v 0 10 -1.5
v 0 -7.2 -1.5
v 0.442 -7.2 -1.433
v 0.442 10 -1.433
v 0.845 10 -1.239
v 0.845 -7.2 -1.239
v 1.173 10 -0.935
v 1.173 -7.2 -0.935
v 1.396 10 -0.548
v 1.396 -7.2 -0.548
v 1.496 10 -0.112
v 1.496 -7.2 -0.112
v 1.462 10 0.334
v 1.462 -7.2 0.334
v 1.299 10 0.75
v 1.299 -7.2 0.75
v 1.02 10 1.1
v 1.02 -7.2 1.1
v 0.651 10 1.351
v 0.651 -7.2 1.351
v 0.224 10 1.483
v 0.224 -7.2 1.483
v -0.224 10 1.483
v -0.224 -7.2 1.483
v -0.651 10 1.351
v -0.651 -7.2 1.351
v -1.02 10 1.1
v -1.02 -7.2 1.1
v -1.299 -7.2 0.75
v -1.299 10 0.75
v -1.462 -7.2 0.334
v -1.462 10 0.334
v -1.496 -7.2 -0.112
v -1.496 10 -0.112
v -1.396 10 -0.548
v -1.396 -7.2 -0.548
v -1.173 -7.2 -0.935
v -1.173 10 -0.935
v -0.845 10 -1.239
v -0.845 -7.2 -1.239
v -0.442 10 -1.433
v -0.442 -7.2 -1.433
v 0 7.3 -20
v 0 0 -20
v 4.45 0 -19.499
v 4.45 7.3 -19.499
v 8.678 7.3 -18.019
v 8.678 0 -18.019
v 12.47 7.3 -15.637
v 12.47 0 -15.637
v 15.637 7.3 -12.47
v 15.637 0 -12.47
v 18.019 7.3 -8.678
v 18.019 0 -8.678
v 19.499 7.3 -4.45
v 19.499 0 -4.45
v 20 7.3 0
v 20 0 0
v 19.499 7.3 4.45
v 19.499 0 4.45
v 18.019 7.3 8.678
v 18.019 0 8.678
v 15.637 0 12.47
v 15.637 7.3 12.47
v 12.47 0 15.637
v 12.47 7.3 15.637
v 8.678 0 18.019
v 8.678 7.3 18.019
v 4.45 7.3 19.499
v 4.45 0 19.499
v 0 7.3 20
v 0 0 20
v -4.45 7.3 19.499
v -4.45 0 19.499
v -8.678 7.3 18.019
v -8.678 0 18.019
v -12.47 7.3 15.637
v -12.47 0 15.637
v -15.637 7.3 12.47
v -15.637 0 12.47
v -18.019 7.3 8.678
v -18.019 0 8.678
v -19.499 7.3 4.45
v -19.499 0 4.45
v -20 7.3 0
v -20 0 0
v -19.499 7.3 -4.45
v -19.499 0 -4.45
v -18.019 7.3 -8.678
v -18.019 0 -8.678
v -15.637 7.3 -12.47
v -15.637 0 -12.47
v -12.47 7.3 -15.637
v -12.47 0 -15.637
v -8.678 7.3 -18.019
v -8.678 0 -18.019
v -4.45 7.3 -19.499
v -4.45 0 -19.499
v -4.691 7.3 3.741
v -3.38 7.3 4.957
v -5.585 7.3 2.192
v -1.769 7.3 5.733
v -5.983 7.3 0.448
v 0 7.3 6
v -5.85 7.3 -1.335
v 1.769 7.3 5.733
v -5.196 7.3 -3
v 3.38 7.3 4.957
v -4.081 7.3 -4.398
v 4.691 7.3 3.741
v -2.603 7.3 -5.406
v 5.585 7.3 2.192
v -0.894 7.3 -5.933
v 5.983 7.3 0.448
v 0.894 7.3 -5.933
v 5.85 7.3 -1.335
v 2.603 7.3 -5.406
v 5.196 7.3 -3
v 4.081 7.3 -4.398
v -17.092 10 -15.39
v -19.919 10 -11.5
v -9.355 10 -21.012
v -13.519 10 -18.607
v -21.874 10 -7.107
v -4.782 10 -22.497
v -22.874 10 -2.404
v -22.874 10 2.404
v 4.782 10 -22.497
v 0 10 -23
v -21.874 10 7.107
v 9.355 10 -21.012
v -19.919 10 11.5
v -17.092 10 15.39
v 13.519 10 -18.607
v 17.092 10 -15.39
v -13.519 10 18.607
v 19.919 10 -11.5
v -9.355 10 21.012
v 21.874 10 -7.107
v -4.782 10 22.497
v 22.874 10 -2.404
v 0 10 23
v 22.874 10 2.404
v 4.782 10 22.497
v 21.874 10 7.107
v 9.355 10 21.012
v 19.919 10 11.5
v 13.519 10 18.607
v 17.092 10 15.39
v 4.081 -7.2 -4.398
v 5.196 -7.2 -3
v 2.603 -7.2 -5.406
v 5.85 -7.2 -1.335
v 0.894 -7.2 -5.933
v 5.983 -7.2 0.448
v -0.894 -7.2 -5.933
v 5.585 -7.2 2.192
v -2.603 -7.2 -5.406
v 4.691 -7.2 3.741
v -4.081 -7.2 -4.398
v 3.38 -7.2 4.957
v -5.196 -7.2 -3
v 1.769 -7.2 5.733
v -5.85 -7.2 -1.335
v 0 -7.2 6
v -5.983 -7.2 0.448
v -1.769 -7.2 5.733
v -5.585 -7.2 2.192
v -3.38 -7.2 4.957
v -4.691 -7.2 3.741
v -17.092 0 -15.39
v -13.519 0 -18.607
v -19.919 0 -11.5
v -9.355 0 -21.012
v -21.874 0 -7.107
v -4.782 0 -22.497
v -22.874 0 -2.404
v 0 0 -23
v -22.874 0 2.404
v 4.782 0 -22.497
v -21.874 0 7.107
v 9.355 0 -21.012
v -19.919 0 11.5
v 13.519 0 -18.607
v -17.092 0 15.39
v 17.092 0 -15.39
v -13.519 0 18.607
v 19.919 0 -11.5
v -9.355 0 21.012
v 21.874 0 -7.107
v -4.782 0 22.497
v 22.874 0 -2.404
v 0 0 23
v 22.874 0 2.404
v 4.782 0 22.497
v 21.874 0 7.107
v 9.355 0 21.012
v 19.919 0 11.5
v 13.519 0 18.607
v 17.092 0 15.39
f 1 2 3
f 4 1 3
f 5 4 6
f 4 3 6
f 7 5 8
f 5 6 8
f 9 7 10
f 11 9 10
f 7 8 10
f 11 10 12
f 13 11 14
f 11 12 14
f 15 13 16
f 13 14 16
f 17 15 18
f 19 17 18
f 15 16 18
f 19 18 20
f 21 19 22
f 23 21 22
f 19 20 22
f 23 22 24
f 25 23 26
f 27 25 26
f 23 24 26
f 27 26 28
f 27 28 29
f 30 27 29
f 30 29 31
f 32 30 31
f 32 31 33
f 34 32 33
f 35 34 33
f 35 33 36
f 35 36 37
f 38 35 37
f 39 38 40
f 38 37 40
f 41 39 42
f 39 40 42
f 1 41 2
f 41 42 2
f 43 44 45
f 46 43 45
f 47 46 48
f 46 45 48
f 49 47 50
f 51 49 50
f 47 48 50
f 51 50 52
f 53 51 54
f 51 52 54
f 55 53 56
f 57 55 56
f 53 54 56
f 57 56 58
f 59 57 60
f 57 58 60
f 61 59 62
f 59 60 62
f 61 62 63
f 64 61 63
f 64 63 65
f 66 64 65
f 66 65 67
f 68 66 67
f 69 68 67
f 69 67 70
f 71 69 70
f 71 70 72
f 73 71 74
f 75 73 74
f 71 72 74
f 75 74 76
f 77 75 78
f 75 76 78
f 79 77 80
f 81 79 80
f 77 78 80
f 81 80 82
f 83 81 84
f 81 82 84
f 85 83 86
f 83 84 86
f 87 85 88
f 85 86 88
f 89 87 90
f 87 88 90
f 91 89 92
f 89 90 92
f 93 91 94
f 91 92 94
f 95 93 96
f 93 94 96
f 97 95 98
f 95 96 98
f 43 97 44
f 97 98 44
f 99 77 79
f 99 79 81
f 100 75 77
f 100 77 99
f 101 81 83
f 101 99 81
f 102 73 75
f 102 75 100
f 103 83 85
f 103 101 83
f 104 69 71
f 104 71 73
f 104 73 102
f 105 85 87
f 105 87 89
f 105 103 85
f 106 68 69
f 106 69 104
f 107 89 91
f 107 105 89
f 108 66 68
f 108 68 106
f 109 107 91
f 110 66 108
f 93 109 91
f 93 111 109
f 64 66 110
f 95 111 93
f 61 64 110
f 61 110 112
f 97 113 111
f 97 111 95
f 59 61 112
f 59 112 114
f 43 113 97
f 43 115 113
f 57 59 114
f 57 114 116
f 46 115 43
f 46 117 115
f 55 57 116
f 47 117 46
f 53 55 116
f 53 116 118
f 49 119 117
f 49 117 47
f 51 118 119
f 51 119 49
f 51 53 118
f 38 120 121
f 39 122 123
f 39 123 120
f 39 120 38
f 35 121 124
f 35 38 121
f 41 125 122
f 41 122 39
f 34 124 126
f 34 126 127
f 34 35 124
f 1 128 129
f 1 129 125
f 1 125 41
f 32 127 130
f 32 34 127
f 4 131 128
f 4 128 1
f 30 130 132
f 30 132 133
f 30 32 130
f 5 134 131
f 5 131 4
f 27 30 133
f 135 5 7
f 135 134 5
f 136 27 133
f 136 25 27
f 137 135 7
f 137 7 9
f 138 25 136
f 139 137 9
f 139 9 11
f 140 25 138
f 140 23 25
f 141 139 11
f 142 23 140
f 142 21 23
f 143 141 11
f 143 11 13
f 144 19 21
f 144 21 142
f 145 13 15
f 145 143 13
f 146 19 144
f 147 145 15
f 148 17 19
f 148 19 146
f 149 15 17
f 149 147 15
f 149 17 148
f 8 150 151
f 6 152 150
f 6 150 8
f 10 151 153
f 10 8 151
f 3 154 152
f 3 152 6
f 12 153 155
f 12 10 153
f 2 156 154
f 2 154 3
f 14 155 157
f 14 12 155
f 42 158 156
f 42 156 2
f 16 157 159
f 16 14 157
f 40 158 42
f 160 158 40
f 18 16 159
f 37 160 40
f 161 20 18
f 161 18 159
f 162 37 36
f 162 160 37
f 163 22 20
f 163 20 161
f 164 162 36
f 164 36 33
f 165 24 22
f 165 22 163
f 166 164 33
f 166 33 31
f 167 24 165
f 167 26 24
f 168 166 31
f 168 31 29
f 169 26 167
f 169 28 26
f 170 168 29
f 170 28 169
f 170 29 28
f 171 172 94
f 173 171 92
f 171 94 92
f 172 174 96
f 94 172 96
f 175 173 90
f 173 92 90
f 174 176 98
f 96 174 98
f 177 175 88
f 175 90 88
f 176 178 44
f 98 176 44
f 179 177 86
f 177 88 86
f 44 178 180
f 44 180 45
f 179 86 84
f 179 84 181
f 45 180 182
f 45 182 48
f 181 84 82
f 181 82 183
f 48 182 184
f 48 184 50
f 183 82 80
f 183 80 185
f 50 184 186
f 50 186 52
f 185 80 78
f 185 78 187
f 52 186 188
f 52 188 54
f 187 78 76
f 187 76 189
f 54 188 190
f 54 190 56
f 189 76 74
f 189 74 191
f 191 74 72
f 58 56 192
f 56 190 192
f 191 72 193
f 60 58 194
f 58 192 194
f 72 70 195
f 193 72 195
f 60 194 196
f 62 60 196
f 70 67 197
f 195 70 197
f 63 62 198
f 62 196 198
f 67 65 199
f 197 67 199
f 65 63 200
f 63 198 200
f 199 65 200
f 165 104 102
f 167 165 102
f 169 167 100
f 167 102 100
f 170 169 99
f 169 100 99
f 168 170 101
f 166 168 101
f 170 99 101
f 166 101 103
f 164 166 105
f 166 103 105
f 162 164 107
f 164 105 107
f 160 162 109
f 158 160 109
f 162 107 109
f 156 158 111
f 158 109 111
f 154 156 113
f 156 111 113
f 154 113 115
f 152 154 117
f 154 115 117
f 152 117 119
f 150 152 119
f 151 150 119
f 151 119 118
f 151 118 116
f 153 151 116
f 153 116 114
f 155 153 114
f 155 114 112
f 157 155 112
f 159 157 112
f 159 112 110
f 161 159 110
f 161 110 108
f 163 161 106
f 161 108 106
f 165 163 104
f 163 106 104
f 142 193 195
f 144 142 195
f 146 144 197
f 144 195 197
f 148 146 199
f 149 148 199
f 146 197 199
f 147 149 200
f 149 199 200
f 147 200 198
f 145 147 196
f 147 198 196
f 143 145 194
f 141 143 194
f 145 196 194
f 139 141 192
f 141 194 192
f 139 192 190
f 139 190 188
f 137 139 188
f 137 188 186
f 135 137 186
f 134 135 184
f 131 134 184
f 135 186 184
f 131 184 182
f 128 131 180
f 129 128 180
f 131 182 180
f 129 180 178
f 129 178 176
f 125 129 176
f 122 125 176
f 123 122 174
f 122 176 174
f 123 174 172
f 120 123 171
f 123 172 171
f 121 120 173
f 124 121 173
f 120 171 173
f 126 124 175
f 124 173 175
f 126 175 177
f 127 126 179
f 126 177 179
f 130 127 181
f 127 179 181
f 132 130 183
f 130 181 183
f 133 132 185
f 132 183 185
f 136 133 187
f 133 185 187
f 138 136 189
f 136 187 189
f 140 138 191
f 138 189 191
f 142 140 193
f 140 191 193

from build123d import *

# Parameters (mm, degrees)
SKETCH1_R           = 23
BOSS_EXTRUDE1_DEPTH = 10
SKETCH2_R           = 20
CUT_EXTRUDE1_DEPTH  = 7.3
SKETCH3_R           = 6
BOSS_EXTRUDE3_DEPTH = 14.5
SKETCH4_R           = 1.5
CUT_EXTRUDE2_DEPTH  = 17.2


with BuildPart() as part:
    # Sketch1 → Boss-Extrude1 (new body)
    with BuildSketch(Plane(origin=(0, 0, 0), x_dir=(1, 0, 0), z_dir=(0, 1, 0))):
        with Locations(Location((0, 0, 0), (0, 0, 270))):
            Circle(SKETCH1_R)
    extrude(amount=BOSS_EXTRUDE1_DEPTH)

    # Sketch2 → Cut-Extrude1 (cut)
    with BuildSketch(Plane.XZ):
        with Locations(Location((0, 0, 0), (0, 0, 270))):
            Circle(SKETCH2_R)
    extrude(amount=-CUT_EXTRUDE1_DEPTH, mode=Mode.SUBTRACT)

    # Sketch3 → Boss-Extrude3 (add)
    with BuildSketch(Plane.XZ.offset(-7.3)):
        with Locations(Location((0, 0, 0), (0, 0, 90))):
            Circle(SKETCH3_R)
    extrude(amount=BOSS_EXTRUDE3_DEPTH)

    # Sketch4 → Cut-Extrude2 (cut)
    with BuildSketch(Plane.XZ.offset(7.2)):
        with Locations(Location((0, 0, 0), (0, 0, 270))):
            Circle(SKETCH4_R)
    extrude(amount=-CUT_EXTRUDE2_DEPTH, mode=Mode.SUBTRACT)


solid = part.part
